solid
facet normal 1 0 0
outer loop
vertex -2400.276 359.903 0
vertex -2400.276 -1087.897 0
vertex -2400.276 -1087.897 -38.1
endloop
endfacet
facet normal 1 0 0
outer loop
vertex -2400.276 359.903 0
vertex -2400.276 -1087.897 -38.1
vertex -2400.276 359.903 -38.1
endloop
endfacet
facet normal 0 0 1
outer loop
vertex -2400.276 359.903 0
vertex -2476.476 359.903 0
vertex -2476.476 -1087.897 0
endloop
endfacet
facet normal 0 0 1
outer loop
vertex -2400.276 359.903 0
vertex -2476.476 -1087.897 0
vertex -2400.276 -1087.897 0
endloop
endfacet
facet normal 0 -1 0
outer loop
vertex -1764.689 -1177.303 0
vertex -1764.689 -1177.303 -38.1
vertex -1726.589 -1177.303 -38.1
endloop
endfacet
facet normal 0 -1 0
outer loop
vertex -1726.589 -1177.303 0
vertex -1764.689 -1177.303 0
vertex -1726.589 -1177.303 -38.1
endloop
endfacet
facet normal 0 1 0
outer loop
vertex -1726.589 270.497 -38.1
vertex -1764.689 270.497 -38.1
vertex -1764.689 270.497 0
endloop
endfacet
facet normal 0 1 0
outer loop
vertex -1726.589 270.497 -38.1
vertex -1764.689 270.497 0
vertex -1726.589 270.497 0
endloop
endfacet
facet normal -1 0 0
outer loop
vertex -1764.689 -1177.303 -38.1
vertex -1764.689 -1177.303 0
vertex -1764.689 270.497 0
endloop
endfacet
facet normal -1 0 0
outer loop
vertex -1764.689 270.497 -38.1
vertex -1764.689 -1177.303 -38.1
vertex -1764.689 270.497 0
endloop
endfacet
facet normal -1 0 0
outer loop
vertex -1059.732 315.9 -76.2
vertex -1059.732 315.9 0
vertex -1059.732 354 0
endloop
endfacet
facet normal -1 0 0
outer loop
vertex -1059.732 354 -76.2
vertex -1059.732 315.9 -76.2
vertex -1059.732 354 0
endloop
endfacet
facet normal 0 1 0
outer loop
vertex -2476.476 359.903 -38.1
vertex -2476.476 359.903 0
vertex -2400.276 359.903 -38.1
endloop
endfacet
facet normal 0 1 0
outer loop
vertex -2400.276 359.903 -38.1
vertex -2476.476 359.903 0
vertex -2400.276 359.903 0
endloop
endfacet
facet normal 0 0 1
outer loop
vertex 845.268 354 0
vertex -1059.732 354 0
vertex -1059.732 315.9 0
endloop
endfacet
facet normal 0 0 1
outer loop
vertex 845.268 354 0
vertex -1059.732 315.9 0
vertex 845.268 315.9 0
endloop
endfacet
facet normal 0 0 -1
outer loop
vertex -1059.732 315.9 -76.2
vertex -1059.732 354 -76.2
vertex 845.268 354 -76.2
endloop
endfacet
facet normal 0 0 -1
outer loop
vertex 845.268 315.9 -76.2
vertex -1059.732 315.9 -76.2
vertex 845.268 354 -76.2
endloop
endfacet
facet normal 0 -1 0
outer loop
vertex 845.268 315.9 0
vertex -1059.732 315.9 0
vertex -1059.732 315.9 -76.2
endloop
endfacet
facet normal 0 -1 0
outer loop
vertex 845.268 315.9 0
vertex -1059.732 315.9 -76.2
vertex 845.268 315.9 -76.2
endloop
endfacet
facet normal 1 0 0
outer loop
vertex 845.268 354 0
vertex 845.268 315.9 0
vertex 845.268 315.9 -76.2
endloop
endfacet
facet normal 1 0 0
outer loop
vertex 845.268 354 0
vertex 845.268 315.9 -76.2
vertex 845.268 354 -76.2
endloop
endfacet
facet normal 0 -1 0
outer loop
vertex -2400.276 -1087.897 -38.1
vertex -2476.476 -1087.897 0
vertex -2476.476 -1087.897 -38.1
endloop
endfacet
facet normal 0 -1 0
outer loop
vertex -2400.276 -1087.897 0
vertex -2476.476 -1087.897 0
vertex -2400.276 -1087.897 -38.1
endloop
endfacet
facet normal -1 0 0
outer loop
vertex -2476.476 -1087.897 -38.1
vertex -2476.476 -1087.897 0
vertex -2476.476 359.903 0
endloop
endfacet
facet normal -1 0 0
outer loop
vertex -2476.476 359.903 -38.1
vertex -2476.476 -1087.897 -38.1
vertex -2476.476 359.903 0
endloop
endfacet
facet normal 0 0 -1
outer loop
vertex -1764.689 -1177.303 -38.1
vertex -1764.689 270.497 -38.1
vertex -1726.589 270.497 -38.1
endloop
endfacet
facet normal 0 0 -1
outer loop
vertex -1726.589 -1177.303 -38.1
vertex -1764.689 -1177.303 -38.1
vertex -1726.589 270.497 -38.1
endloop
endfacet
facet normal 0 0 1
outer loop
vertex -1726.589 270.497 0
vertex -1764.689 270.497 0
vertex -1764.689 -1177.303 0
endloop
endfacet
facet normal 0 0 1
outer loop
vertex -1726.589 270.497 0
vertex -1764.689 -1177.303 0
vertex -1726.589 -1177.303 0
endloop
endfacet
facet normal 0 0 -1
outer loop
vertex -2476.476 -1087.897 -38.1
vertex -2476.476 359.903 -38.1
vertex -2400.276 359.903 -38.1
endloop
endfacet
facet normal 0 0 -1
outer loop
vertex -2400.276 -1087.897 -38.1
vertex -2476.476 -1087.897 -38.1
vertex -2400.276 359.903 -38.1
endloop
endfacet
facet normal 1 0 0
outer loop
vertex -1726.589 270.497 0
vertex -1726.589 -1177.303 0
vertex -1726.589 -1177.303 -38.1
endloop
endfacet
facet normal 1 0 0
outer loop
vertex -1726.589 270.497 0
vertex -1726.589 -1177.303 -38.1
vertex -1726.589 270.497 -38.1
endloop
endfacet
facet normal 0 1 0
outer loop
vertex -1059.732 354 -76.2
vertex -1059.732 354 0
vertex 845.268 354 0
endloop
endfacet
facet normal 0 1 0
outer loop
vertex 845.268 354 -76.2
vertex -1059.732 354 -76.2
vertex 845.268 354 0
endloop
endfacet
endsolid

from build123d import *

# Parameters (mm, degrees)
F0_W     = 1905
F0_H     = 38.1
F1_DEPTH = 76.2
F2_W     = 76.2
F2_H     = 1447.8
F3_DEPTH = 38.1
F4_W     = 38.1
F4_H     = 1447.8
F5_DEPTH = 38.1


with BuildPart() as f1:
    # F0 (on Top) → F1 (new body)
    with BuildSketch(Plane.XY):
        with Locations((-107.231603, 334.950002)):
            Rectangle(F0_W, F0_H)
    extrude(amount=-F1_DEPTH)


with BuildPart() as f3:
    # F2 (on Top) → F3 (new body)
    with BuildSketch(Plane.XY):
        with Locations((-2438.376423, -363.996813)):
            Rectangle(F2_W, F2_H)
    extrude(amount=-F3_DEPTH)


with BuildPart() as f5:
    # F4 (on Top) → F5 (new body)
    with BuildSketch(Plane.XY):
        with Locations((-1745.639146, -453.403354)):
            Rectangle(F4_W, F4_H)
    extrude(amount=-F5_DEPTH)


solid = Compound([f1.part, f3.part, f5.part])
